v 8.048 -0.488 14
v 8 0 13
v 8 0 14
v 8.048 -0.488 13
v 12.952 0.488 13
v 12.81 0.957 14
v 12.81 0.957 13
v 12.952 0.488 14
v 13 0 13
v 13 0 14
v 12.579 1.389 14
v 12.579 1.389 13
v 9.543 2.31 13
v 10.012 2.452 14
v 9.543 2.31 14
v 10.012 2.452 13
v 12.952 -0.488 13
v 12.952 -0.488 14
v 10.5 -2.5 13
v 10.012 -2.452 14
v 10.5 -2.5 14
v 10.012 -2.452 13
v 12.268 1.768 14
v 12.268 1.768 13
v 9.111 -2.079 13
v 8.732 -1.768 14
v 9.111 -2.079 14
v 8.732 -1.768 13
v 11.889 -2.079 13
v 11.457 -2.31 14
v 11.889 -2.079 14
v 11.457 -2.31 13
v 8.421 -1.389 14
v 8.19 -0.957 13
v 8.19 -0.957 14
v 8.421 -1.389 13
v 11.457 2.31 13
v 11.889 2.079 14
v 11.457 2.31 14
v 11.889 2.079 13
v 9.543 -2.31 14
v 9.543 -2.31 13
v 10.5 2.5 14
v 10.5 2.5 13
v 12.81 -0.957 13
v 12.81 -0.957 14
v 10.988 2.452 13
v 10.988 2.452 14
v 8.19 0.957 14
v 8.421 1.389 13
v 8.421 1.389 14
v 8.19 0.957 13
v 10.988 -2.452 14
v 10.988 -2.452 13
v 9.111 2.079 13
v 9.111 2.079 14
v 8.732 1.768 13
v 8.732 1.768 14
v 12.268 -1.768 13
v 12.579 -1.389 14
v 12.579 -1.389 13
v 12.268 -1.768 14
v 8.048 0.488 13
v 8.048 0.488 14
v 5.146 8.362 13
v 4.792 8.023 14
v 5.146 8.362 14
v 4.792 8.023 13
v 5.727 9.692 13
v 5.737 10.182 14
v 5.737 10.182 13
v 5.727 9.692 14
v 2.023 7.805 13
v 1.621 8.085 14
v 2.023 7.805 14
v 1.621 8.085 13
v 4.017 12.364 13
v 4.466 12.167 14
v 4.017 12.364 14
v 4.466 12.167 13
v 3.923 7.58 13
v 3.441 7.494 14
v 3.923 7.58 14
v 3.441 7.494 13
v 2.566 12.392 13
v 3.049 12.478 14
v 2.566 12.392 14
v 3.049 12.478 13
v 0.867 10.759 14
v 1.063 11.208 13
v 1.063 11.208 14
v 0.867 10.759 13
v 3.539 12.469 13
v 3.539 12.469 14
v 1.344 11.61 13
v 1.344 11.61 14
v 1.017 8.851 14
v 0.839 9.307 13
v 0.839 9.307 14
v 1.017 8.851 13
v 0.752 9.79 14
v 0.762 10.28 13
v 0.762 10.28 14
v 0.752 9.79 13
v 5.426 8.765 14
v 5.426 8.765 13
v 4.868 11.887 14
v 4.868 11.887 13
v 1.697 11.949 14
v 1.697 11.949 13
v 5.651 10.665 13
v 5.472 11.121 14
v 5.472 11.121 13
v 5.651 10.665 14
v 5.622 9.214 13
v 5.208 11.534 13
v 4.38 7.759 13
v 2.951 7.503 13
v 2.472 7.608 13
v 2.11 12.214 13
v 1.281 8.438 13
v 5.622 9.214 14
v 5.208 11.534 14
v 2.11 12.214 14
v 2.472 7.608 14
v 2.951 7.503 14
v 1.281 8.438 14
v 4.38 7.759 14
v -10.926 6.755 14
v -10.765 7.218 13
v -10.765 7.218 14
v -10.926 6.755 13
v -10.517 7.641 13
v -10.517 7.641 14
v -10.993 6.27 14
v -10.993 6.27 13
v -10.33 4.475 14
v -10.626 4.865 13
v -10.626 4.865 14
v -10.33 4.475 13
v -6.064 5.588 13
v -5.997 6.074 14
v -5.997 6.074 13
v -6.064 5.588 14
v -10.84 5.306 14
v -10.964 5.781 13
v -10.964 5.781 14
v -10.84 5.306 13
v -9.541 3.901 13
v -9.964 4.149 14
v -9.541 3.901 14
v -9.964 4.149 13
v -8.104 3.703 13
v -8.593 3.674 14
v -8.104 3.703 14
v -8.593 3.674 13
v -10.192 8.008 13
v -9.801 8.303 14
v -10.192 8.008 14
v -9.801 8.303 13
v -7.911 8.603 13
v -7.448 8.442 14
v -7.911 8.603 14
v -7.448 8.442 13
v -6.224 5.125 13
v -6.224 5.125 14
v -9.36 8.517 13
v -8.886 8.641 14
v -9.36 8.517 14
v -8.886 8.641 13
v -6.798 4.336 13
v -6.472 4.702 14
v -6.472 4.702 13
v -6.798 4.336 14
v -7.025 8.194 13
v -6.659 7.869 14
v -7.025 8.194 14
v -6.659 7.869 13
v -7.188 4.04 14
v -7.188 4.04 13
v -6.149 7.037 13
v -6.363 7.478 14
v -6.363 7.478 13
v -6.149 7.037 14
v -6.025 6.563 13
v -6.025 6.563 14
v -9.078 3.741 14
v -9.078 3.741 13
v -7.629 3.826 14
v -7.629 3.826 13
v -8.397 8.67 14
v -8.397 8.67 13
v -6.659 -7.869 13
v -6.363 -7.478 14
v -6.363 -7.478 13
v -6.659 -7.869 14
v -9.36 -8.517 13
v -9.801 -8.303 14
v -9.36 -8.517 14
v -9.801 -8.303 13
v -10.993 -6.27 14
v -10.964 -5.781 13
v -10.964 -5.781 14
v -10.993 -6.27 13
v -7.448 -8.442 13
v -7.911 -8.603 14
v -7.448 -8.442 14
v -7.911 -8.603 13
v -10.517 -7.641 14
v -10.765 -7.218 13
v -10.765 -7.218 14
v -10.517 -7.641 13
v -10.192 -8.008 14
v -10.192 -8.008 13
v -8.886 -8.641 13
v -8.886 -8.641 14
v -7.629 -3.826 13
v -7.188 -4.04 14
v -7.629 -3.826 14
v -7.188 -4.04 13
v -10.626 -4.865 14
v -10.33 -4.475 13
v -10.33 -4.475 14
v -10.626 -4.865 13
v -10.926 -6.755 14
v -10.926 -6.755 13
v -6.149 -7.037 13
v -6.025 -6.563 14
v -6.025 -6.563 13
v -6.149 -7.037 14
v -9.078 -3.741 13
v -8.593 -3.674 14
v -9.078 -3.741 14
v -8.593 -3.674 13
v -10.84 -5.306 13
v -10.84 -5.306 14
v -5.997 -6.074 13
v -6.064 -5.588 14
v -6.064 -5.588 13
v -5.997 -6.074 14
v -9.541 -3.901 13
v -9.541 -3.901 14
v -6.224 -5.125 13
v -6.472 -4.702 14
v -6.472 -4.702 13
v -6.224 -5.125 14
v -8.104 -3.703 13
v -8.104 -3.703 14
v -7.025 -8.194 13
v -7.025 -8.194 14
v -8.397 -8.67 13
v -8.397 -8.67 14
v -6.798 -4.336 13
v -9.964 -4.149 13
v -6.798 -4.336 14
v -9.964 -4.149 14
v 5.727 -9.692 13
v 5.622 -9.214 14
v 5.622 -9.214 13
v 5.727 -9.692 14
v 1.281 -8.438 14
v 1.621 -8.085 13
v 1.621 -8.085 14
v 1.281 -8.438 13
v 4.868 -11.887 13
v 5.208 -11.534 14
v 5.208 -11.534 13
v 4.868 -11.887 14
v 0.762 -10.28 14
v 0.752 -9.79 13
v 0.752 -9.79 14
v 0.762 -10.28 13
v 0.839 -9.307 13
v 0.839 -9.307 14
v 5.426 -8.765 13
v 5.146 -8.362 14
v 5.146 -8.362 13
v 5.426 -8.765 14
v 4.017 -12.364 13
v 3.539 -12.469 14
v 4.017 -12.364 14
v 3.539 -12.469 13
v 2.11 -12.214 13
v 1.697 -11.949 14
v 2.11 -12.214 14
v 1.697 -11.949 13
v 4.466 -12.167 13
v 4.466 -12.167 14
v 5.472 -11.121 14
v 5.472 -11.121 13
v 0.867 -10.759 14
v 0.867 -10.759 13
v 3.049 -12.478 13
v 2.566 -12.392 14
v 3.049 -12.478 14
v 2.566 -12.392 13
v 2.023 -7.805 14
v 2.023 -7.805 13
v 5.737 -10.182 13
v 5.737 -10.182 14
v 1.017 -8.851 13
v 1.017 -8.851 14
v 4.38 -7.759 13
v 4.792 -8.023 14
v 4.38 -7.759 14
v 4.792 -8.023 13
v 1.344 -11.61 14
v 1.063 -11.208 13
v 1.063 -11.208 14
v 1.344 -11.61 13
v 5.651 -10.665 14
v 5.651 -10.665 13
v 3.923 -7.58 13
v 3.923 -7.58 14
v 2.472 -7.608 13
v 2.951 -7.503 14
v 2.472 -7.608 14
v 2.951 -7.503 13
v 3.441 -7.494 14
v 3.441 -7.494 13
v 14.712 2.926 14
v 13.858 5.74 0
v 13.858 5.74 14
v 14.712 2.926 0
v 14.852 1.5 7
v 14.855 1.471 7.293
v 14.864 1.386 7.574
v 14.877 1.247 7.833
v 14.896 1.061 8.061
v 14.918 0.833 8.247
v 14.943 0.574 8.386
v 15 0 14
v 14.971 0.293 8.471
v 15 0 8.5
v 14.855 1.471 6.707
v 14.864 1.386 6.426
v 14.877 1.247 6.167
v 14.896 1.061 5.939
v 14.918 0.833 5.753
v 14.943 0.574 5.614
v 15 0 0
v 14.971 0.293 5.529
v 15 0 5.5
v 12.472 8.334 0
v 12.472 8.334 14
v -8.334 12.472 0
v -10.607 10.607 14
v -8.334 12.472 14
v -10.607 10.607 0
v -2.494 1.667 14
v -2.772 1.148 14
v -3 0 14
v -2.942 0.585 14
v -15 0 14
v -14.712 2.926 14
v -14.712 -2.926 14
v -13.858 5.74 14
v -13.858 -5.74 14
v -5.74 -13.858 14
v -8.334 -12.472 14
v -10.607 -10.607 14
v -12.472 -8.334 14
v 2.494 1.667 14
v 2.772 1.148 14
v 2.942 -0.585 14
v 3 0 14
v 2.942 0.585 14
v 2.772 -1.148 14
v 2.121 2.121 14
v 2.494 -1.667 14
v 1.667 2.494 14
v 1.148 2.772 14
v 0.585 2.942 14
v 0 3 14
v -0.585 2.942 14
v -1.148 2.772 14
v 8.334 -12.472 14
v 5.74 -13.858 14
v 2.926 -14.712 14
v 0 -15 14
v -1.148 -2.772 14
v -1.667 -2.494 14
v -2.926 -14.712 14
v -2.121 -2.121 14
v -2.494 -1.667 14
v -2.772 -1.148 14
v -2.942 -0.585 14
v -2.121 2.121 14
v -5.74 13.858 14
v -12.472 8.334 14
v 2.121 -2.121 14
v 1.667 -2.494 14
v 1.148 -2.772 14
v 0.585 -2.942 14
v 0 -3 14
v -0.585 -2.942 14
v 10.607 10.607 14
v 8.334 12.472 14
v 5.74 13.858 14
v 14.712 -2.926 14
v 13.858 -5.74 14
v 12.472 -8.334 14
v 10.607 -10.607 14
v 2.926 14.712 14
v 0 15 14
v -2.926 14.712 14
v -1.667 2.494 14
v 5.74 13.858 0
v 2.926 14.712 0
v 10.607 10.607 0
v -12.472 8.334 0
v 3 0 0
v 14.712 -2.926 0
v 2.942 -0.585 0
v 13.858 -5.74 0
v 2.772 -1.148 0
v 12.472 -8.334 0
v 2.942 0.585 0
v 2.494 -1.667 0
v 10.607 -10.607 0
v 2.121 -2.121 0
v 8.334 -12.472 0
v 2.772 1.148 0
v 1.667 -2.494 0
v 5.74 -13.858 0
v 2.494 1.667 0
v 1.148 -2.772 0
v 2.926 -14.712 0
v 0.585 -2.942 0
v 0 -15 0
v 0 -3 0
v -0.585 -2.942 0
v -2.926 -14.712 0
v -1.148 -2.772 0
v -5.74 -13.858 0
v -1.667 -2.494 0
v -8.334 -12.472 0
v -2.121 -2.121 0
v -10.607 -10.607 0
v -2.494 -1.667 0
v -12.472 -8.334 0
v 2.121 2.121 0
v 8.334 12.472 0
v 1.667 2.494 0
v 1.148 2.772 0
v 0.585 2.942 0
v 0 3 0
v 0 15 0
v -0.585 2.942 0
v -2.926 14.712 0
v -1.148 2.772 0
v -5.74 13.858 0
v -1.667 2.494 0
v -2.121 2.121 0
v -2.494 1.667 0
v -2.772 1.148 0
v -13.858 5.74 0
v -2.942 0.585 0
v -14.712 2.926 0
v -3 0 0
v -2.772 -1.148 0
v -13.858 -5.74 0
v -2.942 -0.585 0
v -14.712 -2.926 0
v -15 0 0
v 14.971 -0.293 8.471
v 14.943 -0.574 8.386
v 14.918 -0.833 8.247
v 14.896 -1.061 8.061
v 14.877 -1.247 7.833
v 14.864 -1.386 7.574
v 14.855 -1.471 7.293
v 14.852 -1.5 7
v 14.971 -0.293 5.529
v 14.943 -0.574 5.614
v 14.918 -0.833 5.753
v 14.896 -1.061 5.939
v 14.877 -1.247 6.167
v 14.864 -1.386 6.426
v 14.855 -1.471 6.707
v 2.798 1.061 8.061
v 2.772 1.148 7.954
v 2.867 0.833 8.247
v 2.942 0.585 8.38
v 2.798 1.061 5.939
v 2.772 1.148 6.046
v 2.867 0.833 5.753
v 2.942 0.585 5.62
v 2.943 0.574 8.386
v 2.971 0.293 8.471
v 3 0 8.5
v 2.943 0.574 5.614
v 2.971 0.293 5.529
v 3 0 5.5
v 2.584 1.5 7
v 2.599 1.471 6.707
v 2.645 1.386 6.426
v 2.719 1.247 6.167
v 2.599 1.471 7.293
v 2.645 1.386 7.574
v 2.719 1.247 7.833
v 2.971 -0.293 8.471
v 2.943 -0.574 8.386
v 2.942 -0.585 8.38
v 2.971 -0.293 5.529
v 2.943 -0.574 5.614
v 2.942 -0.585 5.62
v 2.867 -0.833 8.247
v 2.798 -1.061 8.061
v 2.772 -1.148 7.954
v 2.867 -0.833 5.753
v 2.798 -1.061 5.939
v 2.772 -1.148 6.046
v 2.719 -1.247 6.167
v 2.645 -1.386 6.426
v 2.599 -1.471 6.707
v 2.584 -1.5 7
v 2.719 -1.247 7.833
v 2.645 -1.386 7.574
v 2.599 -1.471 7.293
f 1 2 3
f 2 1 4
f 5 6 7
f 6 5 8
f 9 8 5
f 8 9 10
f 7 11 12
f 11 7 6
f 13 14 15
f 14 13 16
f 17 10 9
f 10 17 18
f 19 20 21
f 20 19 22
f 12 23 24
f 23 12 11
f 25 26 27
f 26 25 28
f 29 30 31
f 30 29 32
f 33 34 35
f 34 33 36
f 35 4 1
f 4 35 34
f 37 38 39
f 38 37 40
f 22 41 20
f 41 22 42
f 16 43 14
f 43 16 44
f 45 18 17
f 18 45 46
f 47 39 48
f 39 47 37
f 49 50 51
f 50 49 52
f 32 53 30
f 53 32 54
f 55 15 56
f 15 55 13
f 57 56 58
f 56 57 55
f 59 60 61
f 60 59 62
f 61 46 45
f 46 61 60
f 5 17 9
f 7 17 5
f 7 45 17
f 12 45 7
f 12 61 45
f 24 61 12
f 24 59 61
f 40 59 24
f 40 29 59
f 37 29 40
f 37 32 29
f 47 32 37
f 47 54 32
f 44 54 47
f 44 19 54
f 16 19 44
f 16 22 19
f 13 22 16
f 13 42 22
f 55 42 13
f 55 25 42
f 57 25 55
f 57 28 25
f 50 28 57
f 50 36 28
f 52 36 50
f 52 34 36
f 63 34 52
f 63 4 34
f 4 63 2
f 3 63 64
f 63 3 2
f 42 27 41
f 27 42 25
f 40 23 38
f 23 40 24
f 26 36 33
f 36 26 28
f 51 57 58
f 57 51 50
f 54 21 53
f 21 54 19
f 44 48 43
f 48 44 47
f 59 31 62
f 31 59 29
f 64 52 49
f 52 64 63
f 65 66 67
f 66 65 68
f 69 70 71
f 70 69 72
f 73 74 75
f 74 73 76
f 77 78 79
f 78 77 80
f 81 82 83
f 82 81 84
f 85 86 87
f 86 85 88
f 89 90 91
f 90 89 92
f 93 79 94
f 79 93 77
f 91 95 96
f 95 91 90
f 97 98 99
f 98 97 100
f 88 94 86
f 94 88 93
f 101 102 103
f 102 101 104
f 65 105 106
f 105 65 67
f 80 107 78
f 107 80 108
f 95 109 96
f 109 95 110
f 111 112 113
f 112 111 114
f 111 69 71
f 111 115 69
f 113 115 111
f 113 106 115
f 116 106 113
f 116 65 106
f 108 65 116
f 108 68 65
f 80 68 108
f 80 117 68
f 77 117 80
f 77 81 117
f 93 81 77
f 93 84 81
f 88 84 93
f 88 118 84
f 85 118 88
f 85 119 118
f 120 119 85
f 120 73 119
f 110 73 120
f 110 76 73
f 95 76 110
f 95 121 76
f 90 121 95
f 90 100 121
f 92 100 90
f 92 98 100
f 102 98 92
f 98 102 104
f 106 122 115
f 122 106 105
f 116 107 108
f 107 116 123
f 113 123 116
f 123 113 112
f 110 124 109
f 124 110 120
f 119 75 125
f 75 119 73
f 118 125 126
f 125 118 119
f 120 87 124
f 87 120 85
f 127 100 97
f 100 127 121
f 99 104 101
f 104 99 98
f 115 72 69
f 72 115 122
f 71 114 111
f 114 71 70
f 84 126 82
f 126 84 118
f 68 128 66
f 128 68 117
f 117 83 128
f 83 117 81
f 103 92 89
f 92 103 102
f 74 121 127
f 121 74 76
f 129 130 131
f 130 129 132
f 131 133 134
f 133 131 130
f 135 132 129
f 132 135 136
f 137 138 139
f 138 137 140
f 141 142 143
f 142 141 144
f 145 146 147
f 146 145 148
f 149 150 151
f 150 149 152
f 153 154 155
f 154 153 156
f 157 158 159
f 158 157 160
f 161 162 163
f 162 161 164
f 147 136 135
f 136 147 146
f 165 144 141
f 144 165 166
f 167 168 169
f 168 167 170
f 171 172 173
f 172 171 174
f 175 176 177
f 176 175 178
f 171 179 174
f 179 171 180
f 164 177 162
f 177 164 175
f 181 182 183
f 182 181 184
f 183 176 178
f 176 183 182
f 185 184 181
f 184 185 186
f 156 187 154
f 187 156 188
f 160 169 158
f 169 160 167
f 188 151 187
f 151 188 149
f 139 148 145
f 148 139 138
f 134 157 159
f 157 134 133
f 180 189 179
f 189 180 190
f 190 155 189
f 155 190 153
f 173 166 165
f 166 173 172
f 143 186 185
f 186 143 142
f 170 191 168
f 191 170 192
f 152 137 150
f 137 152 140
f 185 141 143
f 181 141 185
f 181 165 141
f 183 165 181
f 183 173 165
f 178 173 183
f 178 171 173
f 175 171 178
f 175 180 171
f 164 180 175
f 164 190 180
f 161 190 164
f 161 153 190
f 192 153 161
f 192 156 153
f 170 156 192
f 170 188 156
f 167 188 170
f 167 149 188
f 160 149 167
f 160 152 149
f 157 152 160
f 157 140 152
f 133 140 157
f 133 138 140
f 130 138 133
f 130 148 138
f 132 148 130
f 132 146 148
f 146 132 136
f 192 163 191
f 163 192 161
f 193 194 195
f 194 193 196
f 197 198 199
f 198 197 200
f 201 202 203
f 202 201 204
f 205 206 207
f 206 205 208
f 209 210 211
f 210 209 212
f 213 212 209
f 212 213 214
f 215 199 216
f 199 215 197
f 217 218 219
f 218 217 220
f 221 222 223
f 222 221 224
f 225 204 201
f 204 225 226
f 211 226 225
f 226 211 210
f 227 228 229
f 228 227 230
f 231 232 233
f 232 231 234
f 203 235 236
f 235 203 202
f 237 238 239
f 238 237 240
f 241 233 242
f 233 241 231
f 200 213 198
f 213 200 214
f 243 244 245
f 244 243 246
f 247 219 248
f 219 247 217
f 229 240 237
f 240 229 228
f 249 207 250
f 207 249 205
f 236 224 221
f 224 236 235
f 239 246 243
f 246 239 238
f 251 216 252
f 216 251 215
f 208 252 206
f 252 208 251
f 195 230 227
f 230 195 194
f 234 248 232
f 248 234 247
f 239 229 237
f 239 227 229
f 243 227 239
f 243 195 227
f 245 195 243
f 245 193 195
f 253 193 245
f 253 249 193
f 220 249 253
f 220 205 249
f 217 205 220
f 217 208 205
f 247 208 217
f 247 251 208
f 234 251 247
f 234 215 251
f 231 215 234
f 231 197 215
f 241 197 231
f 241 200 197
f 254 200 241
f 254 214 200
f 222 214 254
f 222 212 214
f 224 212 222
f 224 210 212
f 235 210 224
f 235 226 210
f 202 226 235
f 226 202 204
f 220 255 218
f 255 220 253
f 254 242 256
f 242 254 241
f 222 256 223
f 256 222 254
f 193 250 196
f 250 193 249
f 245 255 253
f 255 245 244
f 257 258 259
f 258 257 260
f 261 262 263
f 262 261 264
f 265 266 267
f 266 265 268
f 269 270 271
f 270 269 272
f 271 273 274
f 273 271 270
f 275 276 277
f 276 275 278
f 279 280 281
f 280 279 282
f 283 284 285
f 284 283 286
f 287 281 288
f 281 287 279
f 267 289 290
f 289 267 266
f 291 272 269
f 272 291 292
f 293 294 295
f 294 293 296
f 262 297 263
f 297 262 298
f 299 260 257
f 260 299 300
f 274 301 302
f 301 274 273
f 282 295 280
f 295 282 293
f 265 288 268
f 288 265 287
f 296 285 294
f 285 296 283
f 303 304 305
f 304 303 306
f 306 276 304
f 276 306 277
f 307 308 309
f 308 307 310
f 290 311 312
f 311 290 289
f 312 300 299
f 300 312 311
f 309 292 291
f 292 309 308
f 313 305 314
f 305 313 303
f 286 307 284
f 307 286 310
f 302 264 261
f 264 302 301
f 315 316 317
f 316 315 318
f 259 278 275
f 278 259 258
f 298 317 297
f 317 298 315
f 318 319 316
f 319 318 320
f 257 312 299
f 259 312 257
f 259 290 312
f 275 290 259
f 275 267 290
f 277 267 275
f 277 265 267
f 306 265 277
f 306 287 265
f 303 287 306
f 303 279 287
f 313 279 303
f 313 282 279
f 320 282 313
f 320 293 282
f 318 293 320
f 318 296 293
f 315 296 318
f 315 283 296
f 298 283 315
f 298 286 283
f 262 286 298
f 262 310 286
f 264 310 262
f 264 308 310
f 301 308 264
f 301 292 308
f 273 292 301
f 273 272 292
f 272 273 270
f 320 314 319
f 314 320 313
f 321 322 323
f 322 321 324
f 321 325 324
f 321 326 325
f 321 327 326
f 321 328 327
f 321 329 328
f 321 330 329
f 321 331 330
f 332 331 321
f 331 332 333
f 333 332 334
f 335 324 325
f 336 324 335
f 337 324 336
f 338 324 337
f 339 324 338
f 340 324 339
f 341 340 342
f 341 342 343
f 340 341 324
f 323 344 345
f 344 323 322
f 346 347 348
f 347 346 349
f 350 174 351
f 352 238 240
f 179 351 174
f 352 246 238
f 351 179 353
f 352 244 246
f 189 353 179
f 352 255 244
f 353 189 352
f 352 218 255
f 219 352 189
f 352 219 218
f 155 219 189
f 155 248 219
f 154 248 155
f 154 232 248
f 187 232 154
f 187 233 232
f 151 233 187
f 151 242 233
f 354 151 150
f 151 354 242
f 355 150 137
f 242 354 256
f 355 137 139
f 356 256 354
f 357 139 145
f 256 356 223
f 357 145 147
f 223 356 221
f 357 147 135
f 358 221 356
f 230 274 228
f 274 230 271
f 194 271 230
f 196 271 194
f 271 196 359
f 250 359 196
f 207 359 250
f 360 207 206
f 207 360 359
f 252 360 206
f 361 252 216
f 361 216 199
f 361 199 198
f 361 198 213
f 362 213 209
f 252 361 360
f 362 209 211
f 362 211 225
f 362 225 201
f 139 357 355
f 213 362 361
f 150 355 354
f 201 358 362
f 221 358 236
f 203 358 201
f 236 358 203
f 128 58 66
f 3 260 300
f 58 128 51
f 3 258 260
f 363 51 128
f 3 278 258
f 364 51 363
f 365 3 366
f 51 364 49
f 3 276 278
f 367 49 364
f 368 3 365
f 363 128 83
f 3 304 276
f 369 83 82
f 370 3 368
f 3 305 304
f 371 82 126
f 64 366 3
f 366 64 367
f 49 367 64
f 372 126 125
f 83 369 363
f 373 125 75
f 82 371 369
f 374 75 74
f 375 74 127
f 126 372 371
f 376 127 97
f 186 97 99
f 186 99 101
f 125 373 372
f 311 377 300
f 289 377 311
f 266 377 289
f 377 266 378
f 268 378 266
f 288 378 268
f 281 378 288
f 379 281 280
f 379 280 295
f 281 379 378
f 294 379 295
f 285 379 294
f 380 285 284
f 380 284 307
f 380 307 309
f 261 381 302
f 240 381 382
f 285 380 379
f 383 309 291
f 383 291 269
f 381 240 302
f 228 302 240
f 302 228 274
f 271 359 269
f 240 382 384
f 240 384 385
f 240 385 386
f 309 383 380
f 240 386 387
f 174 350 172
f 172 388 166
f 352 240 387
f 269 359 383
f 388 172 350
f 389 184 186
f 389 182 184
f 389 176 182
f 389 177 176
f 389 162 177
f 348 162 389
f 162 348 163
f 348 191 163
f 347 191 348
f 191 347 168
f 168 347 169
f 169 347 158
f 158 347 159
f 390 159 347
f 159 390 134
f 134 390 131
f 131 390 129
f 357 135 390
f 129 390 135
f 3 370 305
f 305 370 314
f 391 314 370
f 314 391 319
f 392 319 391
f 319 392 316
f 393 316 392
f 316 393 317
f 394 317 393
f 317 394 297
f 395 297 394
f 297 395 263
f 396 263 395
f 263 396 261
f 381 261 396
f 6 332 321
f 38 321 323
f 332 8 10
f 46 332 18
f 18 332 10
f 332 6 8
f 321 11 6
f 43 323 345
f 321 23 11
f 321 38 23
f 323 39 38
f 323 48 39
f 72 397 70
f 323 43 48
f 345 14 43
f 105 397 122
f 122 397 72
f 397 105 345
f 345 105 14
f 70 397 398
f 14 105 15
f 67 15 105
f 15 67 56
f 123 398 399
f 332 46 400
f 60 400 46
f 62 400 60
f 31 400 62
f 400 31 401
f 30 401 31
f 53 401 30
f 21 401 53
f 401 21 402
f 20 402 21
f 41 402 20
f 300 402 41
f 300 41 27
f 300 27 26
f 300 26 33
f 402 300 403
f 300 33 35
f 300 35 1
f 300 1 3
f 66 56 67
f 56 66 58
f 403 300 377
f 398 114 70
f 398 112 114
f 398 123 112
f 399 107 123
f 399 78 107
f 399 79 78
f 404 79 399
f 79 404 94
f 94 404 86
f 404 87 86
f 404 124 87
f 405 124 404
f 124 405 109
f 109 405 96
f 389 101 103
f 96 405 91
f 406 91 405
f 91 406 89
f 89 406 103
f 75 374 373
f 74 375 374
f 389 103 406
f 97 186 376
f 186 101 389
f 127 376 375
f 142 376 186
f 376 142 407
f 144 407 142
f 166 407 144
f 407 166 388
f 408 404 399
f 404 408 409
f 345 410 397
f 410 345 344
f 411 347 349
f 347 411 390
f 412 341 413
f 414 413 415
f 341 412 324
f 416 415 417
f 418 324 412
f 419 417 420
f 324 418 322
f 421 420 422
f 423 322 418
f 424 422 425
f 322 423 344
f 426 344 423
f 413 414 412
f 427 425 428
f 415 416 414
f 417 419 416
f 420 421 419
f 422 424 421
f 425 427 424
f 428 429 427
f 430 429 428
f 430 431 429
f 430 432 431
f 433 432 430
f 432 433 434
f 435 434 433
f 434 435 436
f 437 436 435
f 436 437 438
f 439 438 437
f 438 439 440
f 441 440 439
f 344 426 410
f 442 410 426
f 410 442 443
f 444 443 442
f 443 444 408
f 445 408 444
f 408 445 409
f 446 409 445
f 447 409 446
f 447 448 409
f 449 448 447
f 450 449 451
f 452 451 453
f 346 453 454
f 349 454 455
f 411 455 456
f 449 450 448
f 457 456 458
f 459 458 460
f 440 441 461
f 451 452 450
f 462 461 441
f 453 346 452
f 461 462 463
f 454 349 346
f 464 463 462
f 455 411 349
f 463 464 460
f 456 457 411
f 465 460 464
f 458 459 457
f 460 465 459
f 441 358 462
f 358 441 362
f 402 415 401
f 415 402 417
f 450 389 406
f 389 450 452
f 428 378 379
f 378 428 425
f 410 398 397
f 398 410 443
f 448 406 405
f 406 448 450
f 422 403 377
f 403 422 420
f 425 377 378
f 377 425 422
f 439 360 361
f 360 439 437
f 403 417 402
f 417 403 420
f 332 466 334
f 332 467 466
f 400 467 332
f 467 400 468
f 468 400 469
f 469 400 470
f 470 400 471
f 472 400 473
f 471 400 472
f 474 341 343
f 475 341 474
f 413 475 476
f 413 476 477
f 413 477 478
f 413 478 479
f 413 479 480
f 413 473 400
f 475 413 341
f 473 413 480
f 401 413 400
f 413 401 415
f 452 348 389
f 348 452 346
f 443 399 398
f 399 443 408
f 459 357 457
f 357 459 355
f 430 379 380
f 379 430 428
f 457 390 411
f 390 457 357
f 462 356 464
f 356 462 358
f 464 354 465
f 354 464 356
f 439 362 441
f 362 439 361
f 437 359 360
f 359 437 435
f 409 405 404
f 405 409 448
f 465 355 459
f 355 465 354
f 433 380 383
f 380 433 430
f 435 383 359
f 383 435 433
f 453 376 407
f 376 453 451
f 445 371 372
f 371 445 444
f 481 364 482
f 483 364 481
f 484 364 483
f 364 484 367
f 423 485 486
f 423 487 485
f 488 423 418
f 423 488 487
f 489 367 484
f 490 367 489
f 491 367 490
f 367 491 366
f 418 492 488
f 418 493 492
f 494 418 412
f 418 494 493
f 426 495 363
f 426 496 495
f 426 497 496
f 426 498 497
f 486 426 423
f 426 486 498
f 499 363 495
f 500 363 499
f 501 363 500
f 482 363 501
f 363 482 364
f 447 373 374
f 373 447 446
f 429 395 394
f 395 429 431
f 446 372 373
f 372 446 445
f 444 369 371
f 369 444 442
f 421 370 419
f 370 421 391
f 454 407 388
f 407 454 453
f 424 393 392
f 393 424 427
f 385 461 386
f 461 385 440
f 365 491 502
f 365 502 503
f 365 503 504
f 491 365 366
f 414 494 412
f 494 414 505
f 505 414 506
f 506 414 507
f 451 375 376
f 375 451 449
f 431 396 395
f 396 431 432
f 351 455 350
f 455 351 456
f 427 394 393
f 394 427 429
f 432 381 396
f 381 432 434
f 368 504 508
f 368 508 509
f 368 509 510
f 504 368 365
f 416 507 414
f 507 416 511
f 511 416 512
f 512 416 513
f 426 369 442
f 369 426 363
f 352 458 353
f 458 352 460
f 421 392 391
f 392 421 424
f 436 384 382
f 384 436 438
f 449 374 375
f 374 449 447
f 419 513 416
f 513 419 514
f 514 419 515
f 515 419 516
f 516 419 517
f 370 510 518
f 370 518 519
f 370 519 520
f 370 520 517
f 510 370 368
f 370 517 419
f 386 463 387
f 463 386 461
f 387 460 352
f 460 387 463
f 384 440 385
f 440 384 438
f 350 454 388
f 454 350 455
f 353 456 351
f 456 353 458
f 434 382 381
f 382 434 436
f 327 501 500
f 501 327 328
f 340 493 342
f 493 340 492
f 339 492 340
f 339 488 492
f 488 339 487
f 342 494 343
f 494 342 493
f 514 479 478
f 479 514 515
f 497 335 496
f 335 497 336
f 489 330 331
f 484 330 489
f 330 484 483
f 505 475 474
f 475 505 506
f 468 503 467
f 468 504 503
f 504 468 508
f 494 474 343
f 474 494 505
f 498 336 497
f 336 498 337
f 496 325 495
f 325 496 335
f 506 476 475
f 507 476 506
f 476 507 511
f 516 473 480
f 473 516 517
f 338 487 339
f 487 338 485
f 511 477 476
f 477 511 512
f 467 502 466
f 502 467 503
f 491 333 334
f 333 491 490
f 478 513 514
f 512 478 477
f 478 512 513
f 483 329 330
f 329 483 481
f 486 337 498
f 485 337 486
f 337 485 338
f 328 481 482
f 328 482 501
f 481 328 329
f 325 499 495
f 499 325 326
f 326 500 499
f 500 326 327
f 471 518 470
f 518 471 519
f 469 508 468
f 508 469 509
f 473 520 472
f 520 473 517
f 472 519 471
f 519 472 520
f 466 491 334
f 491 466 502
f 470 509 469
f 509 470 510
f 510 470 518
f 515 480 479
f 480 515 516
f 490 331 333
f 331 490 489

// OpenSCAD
$fn = 32;

// ----------------------------------------------------------------------
// Control knob: dimpled knob
// ----------------------------------------------------------------------

// --- parameters (mm) ---
dimp_d = 5;               // finger dimple diameter
n_dimp = 5;               // number of dimples
dimp_r = 10.5;            // dimple ring radius
knob_d = 30;              // knob body diameter
knob_h = 14;              // knob body height
bore_d = 6;               // shaft bore diameter
set_d = 3;                // set screw bore diameter
fit_tol = 0.1;            // tolerance for press fits, mm
free_tol = 0.5;           // tolerance for clearance fits, mm

dimp_step = 360 / n_dimp;  // dimple angular step

difference() {
  cylinder(h = knob_h, d = knob_d);
  translate([0, 0, -1]) cylinder(h = knob_h + 2, d = bore_d);
  translate([-1, 0, knob_h / 2]) rotate([0, 90, 0])
    cylinder(h = knob_d / 2 + bore_d / 2 + 2, d = set_d);  for (i = [0 : n_dimp - 1])
    rotate([0, 0, i * dimp_step])
      translate([dimp_r, 0, knob_h - 1])
        cylinder(h = 2, d = dimp_d);
}
